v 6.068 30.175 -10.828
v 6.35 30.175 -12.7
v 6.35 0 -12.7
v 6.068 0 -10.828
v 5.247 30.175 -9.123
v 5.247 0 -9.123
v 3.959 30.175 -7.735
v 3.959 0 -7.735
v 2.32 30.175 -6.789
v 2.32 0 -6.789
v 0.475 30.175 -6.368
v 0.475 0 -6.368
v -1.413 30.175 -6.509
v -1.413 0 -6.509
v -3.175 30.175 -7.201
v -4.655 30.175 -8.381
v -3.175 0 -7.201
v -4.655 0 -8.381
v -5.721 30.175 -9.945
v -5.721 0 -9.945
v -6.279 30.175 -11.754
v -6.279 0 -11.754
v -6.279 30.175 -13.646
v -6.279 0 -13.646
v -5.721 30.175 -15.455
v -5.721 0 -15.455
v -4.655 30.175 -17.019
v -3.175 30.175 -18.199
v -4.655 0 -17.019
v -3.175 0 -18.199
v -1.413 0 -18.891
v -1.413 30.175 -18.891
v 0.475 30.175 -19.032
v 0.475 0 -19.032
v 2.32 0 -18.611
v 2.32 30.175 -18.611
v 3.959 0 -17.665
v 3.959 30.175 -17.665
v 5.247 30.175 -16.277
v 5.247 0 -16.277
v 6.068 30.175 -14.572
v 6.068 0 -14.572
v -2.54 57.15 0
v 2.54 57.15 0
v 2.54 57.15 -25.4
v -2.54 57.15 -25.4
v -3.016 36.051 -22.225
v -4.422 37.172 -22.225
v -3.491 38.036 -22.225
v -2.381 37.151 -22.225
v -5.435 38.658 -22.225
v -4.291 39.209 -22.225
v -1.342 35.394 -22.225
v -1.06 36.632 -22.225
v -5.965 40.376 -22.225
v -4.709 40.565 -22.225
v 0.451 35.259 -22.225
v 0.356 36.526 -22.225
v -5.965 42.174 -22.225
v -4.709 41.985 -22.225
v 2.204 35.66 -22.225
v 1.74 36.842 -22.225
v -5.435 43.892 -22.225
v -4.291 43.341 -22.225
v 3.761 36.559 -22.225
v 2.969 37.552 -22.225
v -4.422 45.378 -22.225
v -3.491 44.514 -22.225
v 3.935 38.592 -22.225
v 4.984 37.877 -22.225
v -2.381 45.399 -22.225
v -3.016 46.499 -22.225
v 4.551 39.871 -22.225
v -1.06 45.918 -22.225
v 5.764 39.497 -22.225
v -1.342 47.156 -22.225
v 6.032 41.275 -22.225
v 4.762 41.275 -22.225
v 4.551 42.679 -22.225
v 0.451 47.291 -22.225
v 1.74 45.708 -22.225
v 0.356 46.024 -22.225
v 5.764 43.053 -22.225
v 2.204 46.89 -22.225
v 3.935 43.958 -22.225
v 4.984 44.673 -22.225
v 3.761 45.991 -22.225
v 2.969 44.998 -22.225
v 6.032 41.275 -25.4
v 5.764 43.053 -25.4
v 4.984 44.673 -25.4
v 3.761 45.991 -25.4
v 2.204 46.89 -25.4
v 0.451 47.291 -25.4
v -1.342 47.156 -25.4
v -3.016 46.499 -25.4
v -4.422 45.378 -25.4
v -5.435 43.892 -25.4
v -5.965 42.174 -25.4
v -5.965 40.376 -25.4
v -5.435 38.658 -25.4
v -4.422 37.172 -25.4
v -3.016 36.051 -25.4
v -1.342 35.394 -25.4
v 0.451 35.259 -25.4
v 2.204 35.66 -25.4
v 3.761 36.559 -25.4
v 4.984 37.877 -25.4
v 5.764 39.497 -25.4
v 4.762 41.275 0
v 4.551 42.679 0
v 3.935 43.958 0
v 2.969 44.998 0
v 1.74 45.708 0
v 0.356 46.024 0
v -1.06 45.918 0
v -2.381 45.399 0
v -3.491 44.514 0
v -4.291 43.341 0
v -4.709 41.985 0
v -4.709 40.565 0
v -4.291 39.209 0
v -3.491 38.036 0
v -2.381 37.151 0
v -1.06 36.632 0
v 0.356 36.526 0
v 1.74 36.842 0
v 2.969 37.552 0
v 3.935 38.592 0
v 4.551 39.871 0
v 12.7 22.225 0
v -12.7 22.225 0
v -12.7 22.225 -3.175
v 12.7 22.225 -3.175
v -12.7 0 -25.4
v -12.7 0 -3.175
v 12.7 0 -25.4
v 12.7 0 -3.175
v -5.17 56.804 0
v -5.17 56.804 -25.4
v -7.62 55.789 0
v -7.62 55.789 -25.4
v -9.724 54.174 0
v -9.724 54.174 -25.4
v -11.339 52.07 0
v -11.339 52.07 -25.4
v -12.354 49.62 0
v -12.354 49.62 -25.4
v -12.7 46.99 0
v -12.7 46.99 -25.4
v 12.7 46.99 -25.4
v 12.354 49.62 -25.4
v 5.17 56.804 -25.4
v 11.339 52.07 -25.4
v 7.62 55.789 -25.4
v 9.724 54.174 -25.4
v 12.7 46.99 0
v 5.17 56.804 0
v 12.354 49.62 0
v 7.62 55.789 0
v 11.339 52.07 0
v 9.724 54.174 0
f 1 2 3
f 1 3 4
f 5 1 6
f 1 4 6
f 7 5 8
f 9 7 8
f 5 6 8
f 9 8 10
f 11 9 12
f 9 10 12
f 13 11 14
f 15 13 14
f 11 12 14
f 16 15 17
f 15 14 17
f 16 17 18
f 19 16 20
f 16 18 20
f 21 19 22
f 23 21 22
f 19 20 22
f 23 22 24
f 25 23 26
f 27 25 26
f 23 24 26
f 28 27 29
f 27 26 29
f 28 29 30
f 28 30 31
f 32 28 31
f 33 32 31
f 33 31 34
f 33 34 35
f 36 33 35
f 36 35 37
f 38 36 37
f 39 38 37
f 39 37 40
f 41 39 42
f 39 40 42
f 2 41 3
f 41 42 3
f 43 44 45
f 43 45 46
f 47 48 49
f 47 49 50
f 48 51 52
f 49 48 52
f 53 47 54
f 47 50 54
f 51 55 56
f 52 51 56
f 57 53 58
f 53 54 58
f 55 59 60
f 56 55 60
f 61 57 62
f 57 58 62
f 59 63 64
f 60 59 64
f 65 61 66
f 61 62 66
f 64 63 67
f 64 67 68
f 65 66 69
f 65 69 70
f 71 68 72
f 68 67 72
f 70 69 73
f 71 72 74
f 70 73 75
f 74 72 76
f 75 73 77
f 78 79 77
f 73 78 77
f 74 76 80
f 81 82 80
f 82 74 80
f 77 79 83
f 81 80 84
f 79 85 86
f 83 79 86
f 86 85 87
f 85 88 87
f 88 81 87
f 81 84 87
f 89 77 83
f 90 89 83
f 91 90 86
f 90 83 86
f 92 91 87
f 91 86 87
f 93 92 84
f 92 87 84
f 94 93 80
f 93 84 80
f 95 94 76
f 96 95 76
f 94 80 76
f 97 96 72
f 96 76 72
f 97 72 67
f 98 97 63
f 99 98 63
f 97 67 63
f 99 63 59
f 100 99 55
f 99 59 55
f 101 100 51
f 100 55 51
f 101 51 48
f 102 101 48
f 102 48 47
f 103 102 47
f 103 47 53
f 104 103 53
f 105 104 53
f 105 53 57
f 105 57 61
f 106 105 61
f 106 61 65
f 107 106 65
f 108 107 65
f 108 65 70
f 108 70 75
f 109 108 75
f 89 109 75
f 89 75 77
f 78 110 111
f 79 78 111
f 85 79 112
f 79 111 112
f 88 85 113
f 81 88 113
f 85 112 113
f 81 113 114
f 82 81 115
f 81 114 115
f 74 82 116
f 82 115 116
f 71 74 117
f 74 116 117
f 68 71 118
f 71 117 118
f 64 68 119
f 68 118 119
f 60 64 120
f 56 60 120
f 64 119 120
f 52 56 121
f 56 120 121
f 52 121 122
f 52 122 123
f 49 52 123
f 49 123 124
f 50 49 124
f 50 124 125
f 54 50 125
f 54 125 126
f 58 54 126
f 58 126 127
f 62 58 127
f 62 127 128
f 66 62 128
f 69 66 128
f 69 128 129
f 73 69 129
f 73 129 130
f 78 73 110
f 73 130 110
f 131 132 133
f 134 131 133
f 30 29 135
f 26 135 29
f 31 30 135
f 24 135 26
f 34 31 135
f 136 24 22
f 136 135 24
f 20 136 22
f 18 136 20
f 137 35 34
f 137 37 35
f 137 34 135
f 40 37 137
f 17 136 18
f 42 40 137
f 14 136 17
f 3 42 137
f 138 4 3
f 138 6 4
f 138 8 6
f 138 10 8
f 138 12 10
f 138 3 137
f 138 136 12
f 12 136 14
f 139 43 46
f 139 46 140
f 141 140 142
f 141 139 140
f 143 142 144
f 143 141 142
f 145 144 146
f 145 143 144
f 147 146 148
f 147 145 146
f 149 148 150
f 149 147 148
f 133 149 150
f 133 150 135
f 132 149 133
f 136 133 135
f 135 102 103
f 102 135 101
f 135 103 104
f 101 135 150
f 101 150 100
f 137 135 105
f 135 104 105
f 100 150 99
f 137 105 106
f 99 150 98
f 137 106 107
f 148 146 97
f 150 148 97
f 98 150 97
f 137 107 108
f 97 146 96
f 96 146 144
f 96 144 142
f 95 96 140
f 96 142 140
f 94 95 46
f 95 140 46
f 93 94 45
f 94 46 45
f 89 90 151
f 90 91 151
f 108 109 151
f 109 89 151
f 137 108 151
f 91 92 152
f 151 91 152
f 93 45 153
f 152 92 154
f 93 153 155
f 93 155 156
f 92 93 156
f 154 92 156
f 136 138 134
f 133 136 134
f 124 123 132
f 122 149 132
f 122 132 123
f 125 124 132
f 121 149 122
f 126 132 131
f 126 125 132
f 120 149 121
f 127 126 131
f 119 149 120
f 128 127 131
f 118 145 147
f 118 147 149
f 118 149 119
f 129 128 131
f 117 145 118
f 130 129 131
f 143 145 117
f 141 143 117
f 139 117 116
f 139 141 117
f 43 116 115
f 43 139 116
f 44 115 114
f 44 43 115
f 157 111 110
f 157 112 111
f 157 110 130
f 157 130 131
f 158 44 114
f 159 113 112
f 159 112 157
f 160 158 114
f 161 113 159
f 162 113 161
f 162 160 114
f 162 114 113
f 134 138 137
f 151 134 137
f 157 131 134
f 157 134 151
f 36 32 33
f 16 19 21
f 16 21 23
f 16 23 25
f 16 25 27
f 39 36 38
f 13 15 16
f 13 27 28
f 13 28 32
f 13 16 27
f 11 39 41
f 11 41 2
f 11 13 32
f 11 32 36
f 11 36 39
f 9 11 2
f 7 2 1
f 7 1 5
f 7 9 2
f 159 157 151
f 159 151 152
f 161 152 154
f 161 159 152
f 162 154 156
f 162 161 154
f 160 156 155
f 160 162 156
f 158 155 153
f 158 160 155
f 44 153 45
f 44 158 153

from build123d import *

# Parameters (mm, degrees)
BOSS_EXTRUDE1_DEPTH = 25.4
SKETCH1_3_R         = 4.7625
CUT_EXTRUDE1_DEPTH  = 22.225
SKETCH2_R           = 6.0325
CUT_EXTRUDE2_DEPTH  = 4.175
SKETCH3_W           = 3.175
SKETCH3_H           = 22.225
CUT_EXTRUDE4_DEPTH  = 26.4
SKETCH4_R           = 6.35
CUT_EXTRUDE5_DEPTH  = 30.1752


with BuildPart() as part:
    # Sketch1 → Boss-Extrude1 (new body)
    with BuildSketch(Plane.XY):
        with BuildLine():
            Line((-12.7, 0), (12.7, 0))
            Line((12.7, 0), (12.7, 46.99))
            ThreePointArc((12.7, 46.99), (9.724204897, 54.174204897), (2.54, 57.15))
            Line((2.54, 57.15), (-2.54, 57.15))
            ThreePointArc((-2.54, 57.15), (-9.724204897, 54.174204897), (-12.7, 46.99))
            Line((-12.7, 46.99), (-12.7, 0))
        make_face()
    extrude(amount=-BOSS_EXTRUDE1_DEPTH)

    # Sketch1<3> → Cut-Extrude1 (cut)
    with BuildSketch(Plane.XY):
        with Locations((0, 41.275)):
            Circle(SKETCH1_3_R)
    extrude(amount=-CUT_EXTRUDE1_DEPTH, mode=Mode.SUBTRACT)

    # Sketch2 → Cut-Extrude2 (cut, through all)
    with BuildSketch(Plane.XY.offset(-22.225)):
        with Locations((0, 41.275)):
            Circle(SKETCH2_R)
    extrude(amount=-CUT_EXTRUDE2_DEPTH, mode=Mode.SUBTRACT)

    # Sketch3 → Cut-Extrude4 (cut, through all)
    with BuildSketch(Plane(origin=(12.7, 0, 0), x_dir=(0, 0, -1), z_dir=(1, 0, 0))):
        with Locations((1.5875, 11.1125)):
            Rectangle(SKETCH3_W, SKETCH3_H)
    extrude(amount=-CUT_EXTRUDE4_DEPTH, mode=Mode.SUBTRACT)

    # Sketch4 → Cut-Extrude5 (cut)
    with BuildSketch(Plane.XZ):
        with Locations((0, -12.7)):
            Circle(SKETCH4_R)
    extrude(amount=-CUT_EXTRUDE5_DEPTH, mode=Mode.SUBTRACT)


solid = part.part
